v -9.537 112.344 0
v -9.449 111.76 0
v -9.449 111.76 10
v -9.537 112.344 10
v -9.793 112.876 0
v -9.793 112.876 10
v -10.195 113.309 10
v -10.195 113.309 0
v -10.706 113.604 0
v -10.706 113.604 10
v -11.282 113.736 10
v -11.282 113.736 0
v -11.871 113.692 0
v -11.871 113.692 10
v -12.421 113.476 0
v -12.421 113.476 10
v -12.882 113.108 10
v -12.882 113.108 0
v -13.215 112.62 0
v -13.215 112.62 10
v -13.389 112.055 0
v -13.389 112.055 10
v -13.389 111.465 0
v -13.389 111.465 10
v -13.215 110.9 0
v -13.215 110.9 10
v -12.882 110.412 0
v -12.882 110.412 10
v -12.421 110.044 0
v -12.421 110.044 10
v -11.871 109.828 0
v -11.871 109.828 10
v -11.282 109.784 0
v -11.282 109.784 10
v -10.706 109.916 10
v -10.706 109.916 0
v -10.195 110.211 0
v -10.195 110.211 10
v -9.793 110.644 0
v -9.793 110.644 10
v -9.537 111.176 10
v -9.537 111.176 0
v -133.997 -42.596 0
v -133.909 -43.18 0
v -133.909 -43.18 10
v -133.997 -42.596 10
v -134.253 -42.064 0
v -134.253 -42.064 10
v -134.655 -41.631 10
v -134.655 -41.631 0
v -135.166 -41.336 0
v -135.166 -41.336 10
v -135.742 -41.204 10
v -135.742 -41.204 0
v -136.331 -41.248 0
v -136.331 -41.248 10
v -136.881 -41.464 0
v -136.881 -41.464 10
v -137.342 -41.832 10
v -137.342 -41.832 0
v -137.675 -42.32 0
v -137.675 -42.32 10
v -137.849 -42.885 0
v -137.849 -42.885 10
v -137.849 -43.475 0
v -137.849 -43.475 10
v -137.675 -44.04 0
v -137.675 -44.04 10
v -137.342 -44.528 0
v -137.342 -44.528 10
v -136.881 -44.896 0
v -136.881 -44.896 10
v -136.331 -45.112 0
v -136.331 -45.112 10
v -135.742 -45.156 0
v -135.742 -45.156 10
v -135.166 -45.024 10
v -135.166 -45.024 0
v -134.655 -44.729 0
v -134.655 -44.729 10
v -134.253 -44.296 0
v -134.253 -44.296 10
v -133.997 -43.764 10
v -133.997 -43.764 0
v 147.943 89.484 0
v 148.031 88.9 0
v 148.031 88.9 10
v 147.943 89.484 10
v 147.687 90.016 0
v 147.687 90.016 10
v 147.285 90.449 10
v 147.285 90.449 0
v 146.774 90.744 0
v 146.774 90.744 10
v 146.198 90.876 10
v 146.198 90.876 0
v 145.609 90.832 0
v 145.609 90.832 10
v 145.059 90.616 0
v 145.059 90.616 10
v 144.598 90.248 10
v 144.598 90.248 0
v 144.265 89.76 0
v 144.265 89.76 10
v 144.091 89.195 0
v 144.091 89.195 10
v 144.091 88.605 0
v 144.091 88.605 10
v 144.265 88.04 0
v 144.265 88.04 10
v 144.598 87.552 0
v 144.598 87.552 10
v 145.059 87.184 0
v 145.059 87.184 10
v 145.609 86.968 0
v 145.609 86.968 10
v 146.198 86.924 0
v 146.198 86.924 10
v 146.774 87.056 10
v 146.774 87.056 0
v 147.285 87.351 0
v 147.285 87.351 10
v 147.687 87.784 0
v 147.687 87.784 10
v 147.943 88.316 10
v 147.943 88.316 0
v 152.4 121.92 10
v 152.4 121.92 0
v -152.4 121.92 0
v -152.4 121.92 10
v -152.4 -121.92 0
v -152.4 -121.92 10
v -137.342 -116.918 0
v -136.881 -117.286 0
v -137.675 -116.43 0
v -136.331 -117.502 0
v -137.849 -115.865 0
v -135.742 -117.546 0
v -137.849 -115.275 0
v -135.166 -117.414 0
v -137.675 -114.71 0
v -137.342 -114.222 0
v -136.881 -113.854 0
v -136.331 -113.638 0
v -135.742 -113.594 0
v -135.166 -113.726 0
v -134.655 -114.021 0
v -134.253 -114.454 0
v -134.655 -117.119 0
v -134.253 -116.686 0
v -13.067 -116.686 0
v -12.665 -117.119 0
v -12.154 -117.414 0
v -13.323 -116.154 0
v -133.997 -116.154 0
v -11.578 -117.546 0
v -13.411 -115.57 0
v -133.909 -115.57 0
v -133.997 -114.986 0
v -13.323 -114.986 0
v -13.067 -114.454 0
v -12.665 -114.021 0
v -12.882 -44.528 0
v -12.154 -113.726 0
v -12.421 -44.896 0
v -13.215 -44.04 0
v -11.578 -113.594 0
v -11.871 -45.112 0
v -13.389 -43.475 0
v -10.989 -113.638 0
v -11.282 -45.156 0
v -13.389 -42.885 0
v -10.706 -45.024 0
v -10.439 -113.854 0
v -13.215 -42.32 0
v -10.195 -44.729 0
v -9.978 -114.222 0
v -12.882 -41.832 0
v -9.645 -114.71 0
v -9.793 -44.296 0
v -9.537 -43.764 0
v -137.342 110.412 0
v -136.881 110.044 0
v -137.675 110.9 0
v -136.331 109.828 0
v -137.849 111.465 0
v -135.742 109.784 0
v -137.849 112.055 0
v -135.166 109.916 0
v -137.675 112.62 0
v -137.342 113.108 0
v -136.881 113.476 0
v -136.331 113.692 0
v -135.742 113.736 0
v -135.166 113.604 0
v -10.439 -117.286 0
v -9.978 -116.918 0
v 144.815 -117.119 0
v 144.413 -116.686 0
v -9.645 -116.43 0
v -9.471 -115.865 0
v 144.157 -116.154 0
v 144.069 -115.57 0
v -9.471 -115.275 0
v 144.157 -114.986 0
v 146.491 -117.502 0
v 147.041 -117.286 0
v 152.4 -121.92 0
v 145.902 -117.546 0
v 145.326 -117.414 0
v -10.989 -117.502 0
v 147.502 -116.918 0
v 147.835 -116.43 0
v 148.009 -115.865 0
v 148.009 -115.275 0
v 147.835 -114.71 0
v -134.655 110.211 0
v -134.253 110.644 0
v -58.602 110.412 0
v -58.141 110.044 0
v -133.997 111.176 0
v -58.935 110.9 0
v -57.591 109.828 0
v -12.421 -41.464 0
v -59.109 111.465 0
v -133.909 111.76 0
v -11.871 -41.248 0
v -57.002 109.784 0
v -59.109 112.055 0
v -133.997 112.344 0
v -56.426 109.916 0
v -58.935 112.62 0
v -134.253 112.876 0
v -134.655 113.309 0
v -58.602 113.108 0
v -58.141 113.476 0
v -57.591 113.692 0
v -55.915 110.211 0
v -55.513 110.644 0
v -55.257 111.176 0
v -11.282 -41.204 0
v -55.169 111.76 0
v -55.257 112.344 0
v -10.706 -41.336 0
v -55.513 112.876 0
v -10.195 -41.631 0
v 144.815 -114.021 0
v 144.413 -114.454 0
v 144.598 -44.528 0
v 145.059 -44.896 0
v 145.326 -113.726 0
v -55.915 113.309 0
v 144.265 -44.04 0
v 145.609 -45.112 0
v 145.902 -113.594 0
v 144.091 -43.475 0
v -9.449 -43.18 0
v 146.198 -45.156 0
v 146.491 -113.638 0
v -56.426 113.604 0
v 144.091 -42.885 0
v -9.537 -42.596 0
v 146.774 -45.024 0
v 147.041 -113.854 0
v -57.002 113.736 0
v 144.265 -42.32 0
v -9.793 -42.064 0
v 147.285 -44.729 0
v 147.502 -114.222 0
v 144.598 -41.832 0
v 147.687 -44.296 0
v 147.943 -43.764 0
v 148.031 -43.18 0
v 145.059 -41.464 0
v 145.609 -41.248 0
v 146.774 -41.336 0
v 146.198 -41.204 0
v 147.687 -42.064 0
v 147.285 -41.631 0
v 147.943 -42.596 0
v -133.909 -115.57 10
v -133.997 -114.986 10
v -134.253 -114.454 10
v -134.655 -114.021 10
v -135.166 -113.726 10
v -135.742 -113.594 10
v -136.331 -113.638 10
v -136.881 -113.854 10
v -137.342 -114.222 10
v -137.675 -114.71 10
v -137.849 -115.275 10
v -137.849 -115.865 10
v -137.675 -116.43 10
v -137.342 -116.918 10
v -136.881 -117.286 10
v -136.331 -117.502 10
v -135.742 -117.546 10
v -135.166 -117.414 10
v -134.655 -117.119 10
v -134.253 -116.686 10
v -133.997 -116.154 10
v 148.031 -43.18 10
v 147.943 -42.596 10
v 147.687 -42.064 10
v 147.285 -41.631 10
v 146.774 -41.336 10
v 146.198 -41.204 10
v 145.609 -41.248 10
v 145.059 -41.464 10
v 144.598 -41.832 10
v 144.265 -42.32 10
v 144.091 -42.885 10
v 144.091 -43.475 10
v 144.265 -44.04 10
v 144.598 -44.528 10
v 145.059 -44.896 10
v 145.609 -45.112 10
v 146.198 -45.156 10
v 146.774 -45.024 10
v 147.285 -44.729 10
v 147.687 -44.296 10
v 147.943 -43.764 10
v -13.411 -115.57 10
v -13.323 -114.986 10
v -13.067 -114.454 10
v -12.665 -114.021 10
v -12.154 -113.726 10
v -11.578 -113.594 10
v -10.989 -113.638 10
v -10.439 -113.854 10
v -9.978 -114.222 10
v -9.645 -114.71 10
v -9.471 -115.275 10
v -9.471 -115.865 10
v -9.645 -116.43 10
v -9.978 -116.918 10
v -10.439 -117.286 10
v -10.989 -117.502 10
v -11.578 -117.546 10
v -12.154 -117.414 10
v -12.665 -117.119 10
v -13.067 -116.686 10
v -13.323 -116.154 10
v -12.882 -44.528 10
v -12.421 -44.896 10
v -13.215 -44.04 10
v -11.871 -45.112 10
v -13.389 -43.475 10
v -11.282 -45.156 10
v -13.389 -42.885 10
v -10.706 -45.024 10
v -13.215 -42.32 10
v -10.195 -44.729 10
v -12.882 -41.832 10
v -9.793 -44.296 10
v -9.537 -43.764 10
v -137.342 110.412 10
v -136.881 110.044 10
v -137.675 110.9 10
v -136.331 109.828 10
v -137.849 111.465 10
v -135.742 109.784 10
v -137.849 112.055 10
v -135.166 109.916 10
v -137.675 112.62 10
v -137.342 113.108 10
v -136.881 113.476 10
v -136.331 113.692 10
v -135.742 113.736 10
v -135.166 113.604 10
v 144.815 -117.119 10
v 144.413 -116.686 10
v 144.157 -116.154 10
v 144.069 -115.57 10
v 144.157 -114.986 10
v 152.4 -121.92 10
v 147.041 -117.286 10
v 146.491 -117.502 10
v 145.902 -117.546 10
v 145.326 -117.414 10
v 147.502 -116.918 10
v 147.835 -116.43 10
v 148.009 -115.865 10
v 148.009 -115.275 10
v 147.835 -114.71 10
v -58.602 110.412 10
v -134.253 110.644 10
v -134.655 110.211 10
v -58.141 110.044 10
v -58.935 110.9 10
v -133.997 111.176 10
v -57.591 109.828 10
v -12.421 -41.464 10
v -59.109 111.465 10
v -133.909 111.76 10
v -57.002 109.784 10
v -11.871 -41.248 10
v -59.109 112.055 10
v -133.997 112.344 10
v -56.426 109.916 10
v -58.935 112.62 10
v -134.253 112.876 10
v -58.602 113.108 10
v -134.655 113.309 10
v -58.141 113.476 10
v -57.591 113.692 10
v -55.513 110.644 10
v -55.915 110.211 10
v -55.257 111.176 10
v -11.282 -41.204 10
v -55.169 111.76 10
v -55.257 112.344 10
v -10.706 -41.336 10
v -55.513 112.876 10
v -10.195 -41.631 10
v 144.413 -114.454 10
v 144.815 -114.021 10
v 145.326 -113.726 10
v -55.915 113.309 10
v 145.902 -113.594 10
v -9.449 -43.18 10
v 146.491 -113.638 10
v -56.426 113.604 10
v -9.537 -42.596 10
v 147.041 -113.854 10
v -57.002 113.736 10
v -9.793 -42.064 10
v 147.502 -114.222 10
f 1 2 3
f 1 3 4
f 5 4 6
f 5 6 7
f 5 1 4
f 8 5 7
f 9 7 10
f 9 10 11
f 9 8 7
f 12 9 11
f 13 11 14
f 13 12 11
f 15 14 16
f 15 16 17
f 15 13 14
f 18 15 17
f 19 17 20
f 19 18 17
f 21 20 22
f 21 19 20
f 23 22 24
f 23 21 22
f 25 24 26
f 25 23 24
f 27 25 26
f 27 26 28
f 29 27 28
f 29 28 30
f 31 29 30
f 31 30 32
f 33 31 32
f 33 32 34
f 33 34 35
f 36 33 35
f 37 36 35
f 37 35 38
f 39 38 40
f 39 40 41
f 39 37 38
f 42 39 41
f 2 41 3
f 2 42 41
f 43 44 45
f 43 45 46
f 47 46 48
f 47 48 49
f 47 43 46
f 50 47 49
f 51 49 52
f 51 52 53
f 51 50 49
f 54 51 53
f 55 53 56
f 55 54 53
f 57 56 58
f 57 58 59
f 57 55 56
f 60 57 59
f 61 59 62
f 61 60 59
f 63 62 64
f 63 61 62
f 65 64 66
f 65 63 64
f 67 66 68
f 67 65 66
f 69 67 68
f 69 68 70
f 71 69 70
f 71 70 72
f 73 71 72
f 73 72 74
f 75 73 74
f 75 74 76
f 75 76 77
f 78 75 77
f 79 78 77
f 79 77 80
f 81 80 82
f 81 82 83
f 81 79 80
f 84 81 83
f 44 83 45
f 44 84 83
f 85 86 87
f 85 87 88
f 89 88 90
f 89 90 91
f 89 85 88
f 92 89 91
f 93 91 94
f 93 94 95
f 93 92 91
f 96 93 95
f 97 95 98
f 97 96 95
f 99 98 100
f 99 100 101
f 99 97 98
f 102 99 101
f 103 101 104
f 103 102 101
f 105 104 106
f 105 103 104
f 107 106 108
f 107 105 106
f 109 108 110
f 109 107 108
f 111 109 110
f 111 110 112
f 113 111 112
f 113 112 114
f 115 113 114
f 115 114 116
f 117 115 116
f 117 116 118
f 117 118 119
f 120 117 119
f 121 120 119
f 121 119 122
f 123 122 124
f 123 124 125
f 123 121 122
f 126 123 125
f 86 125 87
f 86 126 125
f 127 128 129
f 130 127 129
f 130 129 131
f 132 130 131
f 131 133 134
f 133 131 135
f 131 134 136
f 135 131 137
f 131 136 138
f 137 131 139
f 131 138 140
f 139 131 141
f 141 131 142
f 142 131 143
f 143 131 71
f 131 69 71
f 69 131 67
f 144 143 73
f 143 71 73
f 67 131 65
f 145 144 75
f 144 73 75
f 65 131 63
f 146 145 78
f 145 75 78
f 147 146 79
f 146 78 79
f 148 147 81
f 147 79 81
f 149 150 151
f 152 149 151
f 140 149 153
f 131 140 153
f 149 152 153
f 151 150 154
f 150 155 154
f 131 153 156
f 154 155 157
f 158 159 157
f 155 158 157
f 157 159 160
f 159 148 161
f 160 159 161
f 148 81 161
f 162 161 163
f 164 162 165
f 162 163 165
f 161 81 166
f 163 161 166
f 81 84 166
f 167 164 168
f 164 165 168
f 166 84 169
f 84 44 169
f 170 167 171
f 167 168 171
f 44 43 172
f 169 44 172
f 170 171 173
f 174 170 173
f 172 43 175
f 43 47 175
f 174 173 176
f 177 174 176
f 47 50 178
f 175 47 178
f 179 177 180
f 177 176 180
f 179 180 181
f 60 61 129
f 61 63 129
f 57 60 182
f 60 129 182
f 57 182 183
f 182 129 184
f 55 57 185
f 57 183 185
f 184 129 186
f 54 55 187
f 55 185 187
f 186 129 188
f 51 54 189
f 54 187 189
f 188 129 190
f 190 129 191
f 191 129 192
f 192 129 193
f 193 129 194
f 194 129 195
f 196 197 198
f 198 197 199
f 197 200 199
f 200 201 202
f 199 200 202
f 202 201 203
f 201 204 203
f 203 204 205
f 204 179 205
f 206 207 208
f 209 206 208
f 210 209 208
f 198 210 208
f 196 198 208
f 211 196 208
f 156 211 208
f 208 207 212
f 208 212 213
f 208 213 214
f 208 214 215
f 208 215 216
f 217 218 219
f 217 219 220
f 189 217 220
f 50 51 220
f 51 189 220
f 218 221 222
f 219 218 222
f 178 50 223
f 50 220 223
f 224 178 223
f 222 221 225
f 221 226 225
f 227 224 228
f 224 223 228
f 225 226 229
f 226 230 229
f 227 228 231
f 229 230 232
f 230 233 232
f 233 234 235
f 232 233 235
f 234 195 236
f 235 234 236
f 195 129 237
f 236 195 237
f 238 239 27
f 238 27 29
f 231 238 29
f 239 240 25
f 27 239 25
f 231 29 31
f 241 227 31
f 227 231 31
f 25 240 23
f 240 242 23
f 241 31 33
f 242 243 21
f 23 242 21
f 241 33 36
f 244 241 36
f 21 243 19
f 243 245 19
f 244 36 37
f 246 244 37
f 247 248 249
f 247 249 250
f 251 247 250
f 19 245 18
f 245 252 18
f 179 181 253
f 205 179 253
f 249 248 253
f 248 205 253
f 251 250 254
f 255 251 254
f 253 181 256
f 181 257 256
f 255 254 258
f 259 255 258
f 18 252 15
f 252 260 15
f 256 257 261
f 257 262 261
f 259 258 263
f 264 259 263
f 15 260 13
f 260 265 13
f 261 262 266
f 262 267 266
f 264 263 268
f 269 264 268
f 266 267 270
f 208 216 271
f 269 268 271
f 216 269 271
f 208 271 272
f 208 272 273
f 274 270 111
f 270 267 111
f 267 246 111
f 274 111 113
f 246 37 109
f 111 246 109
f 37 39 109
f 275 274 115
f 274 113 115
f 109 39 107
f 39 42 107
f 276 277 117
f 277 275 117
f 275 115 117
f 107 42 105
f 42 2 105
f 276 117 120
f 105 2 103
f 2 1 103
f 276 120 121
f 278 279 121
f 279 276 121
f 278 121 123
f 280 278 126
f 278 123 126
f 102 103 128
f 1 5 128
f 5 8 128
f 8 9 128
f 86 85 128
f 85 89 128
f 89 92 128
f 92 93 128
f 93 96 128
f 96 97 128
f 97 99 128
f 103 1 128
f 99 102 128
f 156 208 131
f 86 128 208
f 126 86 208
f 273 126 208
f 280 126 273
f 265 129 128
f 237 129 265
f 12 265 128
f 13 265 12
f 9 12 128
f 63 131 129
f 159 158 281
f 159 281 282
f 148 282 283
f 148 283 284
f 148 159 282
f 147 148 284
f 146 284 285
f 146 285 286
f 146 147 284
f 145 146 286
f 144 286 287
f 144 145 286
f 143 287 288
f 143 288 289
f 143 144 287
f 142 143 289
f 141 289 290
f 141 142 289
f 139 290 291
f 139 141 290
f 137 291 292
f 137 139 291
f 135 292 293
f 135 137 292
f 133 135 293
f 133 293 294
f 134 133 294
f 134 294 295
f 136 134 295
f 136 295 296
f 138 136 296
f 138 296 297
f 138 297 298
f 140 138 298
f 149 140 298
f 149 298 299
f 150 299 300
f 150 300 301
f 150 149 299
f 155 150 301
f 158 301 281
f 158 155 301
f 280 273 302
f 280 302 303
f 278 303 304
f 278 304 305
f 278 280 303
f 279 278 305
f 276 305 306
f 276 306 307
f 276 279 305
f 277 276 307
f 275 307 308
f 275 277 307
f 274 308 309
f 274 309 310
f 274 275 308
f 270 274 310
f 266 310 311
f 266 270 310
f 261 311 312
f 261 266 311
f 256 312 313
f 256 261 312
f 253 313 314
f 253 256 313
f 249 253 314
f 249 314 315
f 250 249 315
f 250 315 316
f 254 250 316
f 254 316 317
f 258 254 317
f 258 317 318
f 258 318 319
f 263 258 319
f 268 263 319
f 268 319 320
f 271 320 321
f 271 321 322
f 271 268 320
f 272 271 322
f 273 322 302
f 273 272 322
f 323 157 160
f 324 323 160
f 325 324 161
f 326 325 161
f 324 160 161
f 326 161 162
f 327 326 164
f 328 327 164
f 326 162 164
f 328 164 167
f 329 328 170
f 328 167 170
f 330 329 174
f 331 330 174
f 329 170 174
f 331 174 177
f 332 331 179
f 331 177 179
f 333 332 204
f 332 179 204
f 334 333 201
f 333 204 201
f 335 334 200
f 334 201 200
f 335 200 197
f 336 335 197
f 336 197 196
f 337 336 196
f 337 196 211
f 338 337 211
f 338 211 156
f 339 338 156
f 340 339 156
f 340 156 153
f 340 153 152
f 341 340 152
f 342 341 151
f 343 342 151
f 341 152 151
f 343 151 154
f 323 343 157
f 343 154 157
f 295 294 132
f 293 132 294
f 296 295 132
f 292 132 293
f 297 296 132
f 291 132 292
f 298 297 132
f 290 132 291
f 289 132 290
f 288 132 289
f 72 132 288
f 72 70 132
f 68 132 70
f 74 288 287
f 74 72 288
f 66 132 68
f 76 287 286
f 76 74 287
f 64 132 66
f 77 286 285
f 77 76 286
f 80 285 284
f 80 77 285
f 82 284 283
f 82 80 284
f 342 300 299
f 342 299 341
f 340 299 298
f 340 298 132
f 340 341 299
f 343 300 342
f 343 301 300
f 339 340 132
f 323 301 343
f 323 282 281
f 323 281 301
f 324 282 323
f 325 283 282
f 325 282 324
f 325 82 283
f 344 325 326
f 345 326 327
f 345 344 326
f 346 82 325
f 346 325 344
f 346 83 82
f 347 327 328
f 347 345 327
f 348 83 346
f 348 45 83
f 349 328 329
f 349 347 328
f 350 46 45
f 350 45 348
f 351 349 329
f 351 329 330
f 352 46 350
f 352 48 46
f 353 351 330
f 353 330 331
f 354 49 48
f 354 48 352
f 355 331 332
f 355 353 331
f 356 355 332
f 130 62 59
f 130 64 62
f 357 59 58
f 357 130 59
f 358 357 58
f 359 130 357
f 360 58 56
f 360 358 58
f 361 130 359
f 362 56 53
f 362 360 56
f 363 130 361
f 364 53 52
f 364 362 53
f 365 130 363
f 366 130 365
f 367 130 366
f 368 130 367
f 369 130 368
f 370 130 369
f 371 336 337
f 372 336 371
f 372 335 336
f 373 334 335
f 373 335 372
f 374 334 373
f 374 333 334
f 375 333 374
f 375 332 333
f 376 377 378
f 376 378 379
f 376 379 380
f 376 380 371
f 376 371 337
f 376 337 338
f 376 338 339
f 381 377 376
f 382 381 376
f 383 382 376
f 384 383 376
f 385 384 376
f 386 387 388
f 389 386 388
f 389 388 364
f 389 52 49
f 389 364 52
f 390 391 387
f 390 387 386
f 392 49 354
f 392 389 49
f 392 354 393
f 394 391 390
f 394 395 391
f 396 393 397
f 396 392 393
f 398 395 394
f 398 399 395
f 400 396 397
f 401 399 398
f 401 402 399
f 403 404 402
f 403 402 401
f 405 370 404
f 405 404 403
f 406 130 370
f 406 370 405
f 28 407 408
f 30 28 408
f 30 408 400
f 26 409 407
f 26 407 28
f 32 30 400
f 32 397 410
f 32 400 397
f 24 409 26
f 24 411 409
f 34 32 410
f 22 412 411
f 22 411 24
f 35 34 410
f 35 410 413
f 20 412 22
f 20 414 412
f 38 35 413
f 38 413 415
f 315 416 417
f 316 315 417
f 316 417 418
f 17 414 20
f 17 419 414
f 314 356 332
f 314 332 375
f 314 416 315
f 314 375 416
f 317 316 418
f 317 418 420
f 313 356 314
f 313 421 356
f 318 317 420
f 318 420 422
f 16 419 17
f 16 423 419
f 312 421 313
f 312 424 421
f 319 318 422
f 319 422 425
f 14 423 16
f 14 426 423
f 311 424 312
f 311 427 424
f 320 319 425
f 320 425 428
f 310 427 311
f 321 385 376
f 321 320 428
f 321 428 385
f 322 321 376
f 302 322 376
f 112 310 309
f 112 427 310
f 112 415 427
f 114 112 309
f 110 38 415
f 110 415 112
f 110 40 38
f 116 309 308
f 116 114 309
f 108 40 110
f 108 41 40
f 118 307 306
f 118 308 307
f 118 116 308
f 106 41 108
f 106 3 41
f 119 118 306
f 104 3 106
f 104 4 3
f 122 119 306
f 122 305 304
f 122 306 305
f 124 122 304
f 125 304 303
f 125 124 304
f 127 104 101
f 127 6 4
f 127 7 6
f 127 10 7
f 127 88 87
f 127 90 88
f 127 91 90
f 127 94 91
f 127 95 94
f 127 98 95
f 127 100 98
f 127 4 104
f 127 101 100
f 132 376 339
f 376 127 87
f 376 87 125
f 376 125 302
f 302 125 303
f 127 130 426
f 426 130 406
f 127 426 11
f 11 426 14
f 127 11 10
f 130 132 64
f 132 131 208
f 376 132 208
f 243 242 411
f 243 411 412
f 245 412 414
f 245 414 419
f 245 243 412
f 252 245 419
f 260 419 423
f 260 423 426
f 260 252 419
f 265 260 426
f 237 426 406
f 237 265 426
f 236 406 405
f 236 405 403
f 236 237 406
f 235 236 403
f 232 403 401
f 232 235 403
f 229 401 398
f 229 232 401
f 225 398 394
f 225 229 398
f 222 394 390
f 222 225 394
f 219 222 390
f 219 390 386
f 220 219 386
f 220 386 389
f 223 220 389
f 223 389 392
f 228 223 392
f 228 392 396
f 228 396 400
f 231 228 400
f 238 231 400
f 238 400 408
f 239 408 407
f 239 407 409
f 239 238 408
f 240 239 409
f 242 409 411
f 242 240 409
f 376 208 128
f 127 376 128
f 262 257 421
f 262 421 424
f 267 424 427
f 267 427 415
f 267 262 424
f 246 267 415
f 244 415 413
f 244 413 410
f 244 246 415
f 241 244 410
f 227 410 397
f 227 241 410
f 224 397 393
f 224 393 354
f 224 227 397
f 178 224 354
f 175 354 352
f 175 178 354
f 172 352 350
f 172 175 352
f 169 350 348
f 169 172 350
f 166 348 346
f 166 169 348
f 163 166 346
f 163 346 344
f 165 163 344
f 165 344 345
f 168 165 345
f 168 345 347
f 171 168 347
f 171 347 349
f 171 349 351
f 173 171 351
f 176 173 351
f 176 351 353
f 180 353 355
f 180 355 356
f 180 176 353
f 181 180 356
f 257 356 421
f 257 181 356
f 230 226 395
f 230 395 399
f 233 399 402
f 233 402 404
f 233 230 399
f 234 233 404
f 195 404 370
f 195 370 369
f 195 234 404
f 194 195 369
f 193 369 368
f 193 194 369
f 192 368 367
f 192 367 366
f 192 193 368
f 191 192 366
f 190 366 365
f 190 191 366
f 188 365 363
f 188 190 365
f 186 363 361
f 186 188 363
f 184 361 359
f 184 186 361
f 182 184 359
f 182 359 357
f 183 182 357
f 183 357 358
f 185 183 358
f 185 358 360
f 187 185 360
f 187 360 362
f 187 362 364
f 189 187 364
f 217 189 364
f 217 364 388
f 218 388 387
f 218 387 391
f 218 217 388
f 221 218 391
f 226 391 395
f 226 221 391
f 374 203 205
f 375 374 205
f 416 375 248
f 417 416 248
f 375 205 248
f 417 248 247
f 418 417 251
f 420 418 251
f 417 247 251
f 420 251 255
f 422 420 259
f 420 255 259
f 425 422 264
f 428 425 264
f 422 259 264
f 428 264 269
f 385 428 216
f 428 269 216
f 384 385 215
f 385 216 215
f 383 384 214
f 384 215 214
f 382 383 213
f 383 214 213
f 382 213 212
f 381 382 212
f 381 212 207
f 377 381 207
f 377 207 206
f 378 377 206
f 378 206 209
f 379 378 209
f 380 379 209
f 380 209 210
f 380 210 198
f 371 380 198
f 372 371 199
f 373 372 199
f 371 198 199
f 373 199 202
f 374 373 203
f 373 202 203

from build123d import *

# Parameters (mm, degrees)
F0_R     = 1.9812
F1_DEPTH = 10


with BuildPart() as f1:
    # F0 (on Top) → F1 (new body)
    with BuildSketch(Plane.XY):
        Polygon((-152.4, -121.92), (152.4, -121.92), (152.4, 121.92), (-135.89, 121.92), (-152.4, 121.92), align=None)
        with Locations((-135.89, -115.57)):
            Circle(F0_R, mode=Mode.SUBTRACT)
        with BuildLine():
            ThreePointArc((-9.4488, -115.57), (-11.43, -117.5512), (-13.4112, -115.57))
            ThreePointArc((-13.4112, -115.57), (-11.43, -113.5888), (-9.4488, -115.57))
        make_face(mode=Mode.SUBTRACT)
        with Locations((-135.89, -43.18)):
            Circle(F0_R, mode=Mode.SUBTRACT)
        with Locations((-11.43, -43.18)):
            Circle(F0_R, mode=Mode.SUBTRACT)
        with BuildLine():
            ThreePointArc((148.0312, -115.57), (146.05, -117.5512), (144.0688, -115.57))
            ThreePointArc((144.0688, -115.57), (146.05, -113.5888), (148.0312, -115.57))
        make_face(mode=Mode.SUBTRACT)
        with Locations((146.05, -43.18)):
            Circle(F0_R, mode=Mode.SUBTRACT)
        with Locations((-135.89, 111.76)):
            Circle(F0_R, mode=Mode.SUBTRACT)
        with Locations((-57.15, 111.76)):
            Circle(F0_R, mode=Mode.SUBTRACT)
        with Locations((-11.43, 111.76)):
            Circle(F0_R, mode=Mode.SUBTRACT)
        with Locations((146.05, 88.9)):
            Circle(F0_R, mode=Mode.SUBTRACT)
    extrude(amount=F1_DEPTH)


solid = f1.part
